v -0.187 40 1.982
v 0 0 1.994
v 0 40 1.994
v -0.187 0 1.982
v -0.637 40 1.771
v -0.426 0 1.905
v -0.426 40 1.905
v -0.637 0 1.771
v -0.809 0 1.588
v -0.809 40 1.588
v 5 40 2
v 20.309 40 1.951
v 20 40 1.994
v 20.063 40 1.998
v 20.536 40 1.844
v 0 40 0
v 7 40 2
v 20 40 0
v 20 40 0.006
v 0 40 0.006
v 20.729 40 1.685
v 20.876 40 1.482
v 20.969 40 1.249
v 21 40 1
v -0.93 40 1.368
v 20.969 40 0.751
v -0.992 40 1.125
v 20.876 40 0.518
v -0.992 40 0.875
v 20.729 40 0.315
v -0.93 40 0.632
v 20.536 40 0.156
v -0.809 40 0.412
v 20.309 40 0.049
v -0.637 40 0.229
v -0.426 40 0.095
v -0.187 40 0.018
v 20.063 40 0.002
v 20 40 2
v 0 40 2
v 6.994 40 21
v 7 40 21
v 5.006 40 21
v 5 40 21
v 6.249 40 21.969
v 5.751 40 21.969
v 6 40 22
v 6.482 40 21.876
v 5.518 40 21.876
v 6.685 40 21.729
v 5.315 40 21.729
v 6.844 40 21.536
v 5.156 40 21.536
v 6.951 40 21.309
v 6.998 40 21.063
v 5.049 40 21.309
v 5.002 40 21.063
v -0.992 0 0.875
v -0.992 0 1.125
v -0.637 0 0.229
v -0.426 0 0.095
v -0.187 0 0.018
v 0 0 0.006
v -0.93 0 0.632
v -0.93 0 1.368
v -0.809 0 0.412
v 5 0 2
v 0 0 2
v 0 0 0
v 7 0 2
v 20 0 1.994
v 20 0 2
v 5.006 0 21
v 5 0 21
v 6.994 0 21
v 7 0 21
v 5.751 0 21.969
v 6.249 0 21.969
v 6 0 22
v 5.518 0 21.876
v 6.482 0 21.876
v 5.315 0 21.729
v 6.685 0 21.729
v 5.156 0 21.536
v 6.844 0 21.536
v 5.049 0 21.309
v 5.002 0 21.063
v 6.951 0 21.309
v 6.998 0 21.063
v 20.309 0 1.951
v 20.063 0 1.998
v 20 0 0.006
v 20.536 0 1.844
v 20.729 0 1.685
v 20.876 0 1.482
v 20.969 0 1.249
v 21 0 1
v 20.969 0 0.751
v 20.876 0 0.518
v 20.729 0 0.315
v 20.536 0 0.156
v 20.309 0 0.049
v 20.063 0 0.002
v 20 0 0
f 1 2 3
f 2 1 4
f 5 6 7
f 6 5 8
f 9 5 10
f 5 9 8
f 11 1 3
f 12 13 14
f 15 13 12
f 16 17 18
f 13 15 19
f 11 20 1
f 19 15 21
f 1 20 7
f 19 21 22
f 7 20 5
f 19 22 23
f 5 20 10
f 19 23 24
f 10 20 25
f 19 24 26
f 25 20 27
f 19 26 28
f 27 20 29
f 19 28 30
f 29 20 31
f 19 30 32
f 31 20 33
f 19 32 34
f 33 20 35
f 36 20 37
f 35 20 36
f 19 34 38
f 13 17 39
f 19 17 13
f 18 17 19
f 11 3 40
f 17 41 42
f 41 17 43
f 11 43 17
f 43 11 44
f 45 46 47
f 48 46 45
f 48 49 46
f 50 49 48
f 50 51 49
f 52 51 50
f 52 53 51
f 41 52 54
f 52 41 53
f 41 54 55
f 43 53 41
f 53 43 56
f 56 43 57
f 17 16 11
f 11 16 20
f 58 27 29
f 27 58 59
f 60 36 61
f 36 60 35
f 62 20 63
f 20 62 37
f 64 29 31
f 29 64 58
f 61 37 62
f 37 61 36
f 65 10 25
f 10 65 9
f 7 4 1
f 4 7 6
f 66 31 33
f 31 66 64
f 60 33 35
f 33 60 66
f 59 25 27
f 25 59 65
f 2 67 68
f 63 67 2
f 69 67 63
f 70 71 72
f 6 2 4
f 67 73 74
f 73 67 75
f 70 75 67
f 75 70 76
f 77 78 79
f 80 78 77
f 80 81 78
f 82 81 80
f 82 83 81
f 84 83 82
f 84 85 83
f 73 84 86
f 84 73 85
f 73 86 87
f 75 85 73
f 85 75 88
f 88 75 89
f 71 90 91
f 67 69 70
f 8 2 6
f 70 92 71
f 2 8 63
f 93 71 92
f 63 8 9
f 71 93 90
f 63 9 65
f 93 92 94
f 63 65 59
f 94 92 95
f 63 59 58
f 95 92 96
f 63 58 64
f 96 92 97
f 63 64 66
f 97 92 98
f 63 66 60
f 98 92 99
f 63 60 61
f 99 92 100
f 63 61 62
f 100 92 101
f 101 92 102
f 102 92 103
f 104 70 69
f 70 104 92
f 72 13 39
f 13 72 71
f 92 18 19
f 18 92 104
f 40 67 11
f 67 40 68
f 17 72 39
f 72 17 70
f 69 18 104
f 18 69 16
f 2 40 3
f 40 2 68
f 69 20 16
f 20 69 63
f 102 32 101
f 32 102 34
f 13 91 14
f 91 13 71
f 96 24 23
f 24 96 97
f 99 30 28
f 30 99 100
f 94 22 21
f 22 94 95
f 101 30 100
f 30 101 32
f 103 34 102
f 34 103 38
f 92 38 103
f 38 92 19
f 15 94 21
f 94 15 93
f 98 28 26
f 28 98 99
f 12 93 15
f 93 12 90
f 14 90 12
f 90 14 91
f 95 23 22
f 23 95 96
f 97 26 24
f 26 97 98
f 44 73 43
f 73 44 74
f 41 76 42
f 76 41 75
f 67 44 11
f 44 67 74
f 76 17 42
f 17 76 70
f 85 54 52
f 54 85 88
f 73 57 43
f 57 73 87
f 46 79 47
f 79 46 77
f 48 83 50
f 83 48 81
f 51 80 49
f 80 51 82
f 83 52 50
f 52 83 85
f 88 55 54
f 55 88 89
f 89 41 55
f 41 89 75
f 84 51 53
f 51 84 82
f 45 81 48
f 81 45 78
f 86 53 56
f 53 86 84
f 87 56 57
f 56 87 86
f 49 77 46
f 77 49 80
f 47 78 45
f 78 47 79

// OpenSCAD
/*
   Power strip label holder
*/

l = 40;
w = 20;
h = 2;

$fn = 25;

module edge() {
    translate([0, l, h/2]) rotate([90, 0, 0]) cylinder(l, h/2, h/2);
}

module flat() {
    edge();
    cube([w, l, h]);
    translate([w, 0, 0]) edge();
}

flat();
translate([5 + h, 0, h/2]) rotate([0, -90, 0]) flat();
